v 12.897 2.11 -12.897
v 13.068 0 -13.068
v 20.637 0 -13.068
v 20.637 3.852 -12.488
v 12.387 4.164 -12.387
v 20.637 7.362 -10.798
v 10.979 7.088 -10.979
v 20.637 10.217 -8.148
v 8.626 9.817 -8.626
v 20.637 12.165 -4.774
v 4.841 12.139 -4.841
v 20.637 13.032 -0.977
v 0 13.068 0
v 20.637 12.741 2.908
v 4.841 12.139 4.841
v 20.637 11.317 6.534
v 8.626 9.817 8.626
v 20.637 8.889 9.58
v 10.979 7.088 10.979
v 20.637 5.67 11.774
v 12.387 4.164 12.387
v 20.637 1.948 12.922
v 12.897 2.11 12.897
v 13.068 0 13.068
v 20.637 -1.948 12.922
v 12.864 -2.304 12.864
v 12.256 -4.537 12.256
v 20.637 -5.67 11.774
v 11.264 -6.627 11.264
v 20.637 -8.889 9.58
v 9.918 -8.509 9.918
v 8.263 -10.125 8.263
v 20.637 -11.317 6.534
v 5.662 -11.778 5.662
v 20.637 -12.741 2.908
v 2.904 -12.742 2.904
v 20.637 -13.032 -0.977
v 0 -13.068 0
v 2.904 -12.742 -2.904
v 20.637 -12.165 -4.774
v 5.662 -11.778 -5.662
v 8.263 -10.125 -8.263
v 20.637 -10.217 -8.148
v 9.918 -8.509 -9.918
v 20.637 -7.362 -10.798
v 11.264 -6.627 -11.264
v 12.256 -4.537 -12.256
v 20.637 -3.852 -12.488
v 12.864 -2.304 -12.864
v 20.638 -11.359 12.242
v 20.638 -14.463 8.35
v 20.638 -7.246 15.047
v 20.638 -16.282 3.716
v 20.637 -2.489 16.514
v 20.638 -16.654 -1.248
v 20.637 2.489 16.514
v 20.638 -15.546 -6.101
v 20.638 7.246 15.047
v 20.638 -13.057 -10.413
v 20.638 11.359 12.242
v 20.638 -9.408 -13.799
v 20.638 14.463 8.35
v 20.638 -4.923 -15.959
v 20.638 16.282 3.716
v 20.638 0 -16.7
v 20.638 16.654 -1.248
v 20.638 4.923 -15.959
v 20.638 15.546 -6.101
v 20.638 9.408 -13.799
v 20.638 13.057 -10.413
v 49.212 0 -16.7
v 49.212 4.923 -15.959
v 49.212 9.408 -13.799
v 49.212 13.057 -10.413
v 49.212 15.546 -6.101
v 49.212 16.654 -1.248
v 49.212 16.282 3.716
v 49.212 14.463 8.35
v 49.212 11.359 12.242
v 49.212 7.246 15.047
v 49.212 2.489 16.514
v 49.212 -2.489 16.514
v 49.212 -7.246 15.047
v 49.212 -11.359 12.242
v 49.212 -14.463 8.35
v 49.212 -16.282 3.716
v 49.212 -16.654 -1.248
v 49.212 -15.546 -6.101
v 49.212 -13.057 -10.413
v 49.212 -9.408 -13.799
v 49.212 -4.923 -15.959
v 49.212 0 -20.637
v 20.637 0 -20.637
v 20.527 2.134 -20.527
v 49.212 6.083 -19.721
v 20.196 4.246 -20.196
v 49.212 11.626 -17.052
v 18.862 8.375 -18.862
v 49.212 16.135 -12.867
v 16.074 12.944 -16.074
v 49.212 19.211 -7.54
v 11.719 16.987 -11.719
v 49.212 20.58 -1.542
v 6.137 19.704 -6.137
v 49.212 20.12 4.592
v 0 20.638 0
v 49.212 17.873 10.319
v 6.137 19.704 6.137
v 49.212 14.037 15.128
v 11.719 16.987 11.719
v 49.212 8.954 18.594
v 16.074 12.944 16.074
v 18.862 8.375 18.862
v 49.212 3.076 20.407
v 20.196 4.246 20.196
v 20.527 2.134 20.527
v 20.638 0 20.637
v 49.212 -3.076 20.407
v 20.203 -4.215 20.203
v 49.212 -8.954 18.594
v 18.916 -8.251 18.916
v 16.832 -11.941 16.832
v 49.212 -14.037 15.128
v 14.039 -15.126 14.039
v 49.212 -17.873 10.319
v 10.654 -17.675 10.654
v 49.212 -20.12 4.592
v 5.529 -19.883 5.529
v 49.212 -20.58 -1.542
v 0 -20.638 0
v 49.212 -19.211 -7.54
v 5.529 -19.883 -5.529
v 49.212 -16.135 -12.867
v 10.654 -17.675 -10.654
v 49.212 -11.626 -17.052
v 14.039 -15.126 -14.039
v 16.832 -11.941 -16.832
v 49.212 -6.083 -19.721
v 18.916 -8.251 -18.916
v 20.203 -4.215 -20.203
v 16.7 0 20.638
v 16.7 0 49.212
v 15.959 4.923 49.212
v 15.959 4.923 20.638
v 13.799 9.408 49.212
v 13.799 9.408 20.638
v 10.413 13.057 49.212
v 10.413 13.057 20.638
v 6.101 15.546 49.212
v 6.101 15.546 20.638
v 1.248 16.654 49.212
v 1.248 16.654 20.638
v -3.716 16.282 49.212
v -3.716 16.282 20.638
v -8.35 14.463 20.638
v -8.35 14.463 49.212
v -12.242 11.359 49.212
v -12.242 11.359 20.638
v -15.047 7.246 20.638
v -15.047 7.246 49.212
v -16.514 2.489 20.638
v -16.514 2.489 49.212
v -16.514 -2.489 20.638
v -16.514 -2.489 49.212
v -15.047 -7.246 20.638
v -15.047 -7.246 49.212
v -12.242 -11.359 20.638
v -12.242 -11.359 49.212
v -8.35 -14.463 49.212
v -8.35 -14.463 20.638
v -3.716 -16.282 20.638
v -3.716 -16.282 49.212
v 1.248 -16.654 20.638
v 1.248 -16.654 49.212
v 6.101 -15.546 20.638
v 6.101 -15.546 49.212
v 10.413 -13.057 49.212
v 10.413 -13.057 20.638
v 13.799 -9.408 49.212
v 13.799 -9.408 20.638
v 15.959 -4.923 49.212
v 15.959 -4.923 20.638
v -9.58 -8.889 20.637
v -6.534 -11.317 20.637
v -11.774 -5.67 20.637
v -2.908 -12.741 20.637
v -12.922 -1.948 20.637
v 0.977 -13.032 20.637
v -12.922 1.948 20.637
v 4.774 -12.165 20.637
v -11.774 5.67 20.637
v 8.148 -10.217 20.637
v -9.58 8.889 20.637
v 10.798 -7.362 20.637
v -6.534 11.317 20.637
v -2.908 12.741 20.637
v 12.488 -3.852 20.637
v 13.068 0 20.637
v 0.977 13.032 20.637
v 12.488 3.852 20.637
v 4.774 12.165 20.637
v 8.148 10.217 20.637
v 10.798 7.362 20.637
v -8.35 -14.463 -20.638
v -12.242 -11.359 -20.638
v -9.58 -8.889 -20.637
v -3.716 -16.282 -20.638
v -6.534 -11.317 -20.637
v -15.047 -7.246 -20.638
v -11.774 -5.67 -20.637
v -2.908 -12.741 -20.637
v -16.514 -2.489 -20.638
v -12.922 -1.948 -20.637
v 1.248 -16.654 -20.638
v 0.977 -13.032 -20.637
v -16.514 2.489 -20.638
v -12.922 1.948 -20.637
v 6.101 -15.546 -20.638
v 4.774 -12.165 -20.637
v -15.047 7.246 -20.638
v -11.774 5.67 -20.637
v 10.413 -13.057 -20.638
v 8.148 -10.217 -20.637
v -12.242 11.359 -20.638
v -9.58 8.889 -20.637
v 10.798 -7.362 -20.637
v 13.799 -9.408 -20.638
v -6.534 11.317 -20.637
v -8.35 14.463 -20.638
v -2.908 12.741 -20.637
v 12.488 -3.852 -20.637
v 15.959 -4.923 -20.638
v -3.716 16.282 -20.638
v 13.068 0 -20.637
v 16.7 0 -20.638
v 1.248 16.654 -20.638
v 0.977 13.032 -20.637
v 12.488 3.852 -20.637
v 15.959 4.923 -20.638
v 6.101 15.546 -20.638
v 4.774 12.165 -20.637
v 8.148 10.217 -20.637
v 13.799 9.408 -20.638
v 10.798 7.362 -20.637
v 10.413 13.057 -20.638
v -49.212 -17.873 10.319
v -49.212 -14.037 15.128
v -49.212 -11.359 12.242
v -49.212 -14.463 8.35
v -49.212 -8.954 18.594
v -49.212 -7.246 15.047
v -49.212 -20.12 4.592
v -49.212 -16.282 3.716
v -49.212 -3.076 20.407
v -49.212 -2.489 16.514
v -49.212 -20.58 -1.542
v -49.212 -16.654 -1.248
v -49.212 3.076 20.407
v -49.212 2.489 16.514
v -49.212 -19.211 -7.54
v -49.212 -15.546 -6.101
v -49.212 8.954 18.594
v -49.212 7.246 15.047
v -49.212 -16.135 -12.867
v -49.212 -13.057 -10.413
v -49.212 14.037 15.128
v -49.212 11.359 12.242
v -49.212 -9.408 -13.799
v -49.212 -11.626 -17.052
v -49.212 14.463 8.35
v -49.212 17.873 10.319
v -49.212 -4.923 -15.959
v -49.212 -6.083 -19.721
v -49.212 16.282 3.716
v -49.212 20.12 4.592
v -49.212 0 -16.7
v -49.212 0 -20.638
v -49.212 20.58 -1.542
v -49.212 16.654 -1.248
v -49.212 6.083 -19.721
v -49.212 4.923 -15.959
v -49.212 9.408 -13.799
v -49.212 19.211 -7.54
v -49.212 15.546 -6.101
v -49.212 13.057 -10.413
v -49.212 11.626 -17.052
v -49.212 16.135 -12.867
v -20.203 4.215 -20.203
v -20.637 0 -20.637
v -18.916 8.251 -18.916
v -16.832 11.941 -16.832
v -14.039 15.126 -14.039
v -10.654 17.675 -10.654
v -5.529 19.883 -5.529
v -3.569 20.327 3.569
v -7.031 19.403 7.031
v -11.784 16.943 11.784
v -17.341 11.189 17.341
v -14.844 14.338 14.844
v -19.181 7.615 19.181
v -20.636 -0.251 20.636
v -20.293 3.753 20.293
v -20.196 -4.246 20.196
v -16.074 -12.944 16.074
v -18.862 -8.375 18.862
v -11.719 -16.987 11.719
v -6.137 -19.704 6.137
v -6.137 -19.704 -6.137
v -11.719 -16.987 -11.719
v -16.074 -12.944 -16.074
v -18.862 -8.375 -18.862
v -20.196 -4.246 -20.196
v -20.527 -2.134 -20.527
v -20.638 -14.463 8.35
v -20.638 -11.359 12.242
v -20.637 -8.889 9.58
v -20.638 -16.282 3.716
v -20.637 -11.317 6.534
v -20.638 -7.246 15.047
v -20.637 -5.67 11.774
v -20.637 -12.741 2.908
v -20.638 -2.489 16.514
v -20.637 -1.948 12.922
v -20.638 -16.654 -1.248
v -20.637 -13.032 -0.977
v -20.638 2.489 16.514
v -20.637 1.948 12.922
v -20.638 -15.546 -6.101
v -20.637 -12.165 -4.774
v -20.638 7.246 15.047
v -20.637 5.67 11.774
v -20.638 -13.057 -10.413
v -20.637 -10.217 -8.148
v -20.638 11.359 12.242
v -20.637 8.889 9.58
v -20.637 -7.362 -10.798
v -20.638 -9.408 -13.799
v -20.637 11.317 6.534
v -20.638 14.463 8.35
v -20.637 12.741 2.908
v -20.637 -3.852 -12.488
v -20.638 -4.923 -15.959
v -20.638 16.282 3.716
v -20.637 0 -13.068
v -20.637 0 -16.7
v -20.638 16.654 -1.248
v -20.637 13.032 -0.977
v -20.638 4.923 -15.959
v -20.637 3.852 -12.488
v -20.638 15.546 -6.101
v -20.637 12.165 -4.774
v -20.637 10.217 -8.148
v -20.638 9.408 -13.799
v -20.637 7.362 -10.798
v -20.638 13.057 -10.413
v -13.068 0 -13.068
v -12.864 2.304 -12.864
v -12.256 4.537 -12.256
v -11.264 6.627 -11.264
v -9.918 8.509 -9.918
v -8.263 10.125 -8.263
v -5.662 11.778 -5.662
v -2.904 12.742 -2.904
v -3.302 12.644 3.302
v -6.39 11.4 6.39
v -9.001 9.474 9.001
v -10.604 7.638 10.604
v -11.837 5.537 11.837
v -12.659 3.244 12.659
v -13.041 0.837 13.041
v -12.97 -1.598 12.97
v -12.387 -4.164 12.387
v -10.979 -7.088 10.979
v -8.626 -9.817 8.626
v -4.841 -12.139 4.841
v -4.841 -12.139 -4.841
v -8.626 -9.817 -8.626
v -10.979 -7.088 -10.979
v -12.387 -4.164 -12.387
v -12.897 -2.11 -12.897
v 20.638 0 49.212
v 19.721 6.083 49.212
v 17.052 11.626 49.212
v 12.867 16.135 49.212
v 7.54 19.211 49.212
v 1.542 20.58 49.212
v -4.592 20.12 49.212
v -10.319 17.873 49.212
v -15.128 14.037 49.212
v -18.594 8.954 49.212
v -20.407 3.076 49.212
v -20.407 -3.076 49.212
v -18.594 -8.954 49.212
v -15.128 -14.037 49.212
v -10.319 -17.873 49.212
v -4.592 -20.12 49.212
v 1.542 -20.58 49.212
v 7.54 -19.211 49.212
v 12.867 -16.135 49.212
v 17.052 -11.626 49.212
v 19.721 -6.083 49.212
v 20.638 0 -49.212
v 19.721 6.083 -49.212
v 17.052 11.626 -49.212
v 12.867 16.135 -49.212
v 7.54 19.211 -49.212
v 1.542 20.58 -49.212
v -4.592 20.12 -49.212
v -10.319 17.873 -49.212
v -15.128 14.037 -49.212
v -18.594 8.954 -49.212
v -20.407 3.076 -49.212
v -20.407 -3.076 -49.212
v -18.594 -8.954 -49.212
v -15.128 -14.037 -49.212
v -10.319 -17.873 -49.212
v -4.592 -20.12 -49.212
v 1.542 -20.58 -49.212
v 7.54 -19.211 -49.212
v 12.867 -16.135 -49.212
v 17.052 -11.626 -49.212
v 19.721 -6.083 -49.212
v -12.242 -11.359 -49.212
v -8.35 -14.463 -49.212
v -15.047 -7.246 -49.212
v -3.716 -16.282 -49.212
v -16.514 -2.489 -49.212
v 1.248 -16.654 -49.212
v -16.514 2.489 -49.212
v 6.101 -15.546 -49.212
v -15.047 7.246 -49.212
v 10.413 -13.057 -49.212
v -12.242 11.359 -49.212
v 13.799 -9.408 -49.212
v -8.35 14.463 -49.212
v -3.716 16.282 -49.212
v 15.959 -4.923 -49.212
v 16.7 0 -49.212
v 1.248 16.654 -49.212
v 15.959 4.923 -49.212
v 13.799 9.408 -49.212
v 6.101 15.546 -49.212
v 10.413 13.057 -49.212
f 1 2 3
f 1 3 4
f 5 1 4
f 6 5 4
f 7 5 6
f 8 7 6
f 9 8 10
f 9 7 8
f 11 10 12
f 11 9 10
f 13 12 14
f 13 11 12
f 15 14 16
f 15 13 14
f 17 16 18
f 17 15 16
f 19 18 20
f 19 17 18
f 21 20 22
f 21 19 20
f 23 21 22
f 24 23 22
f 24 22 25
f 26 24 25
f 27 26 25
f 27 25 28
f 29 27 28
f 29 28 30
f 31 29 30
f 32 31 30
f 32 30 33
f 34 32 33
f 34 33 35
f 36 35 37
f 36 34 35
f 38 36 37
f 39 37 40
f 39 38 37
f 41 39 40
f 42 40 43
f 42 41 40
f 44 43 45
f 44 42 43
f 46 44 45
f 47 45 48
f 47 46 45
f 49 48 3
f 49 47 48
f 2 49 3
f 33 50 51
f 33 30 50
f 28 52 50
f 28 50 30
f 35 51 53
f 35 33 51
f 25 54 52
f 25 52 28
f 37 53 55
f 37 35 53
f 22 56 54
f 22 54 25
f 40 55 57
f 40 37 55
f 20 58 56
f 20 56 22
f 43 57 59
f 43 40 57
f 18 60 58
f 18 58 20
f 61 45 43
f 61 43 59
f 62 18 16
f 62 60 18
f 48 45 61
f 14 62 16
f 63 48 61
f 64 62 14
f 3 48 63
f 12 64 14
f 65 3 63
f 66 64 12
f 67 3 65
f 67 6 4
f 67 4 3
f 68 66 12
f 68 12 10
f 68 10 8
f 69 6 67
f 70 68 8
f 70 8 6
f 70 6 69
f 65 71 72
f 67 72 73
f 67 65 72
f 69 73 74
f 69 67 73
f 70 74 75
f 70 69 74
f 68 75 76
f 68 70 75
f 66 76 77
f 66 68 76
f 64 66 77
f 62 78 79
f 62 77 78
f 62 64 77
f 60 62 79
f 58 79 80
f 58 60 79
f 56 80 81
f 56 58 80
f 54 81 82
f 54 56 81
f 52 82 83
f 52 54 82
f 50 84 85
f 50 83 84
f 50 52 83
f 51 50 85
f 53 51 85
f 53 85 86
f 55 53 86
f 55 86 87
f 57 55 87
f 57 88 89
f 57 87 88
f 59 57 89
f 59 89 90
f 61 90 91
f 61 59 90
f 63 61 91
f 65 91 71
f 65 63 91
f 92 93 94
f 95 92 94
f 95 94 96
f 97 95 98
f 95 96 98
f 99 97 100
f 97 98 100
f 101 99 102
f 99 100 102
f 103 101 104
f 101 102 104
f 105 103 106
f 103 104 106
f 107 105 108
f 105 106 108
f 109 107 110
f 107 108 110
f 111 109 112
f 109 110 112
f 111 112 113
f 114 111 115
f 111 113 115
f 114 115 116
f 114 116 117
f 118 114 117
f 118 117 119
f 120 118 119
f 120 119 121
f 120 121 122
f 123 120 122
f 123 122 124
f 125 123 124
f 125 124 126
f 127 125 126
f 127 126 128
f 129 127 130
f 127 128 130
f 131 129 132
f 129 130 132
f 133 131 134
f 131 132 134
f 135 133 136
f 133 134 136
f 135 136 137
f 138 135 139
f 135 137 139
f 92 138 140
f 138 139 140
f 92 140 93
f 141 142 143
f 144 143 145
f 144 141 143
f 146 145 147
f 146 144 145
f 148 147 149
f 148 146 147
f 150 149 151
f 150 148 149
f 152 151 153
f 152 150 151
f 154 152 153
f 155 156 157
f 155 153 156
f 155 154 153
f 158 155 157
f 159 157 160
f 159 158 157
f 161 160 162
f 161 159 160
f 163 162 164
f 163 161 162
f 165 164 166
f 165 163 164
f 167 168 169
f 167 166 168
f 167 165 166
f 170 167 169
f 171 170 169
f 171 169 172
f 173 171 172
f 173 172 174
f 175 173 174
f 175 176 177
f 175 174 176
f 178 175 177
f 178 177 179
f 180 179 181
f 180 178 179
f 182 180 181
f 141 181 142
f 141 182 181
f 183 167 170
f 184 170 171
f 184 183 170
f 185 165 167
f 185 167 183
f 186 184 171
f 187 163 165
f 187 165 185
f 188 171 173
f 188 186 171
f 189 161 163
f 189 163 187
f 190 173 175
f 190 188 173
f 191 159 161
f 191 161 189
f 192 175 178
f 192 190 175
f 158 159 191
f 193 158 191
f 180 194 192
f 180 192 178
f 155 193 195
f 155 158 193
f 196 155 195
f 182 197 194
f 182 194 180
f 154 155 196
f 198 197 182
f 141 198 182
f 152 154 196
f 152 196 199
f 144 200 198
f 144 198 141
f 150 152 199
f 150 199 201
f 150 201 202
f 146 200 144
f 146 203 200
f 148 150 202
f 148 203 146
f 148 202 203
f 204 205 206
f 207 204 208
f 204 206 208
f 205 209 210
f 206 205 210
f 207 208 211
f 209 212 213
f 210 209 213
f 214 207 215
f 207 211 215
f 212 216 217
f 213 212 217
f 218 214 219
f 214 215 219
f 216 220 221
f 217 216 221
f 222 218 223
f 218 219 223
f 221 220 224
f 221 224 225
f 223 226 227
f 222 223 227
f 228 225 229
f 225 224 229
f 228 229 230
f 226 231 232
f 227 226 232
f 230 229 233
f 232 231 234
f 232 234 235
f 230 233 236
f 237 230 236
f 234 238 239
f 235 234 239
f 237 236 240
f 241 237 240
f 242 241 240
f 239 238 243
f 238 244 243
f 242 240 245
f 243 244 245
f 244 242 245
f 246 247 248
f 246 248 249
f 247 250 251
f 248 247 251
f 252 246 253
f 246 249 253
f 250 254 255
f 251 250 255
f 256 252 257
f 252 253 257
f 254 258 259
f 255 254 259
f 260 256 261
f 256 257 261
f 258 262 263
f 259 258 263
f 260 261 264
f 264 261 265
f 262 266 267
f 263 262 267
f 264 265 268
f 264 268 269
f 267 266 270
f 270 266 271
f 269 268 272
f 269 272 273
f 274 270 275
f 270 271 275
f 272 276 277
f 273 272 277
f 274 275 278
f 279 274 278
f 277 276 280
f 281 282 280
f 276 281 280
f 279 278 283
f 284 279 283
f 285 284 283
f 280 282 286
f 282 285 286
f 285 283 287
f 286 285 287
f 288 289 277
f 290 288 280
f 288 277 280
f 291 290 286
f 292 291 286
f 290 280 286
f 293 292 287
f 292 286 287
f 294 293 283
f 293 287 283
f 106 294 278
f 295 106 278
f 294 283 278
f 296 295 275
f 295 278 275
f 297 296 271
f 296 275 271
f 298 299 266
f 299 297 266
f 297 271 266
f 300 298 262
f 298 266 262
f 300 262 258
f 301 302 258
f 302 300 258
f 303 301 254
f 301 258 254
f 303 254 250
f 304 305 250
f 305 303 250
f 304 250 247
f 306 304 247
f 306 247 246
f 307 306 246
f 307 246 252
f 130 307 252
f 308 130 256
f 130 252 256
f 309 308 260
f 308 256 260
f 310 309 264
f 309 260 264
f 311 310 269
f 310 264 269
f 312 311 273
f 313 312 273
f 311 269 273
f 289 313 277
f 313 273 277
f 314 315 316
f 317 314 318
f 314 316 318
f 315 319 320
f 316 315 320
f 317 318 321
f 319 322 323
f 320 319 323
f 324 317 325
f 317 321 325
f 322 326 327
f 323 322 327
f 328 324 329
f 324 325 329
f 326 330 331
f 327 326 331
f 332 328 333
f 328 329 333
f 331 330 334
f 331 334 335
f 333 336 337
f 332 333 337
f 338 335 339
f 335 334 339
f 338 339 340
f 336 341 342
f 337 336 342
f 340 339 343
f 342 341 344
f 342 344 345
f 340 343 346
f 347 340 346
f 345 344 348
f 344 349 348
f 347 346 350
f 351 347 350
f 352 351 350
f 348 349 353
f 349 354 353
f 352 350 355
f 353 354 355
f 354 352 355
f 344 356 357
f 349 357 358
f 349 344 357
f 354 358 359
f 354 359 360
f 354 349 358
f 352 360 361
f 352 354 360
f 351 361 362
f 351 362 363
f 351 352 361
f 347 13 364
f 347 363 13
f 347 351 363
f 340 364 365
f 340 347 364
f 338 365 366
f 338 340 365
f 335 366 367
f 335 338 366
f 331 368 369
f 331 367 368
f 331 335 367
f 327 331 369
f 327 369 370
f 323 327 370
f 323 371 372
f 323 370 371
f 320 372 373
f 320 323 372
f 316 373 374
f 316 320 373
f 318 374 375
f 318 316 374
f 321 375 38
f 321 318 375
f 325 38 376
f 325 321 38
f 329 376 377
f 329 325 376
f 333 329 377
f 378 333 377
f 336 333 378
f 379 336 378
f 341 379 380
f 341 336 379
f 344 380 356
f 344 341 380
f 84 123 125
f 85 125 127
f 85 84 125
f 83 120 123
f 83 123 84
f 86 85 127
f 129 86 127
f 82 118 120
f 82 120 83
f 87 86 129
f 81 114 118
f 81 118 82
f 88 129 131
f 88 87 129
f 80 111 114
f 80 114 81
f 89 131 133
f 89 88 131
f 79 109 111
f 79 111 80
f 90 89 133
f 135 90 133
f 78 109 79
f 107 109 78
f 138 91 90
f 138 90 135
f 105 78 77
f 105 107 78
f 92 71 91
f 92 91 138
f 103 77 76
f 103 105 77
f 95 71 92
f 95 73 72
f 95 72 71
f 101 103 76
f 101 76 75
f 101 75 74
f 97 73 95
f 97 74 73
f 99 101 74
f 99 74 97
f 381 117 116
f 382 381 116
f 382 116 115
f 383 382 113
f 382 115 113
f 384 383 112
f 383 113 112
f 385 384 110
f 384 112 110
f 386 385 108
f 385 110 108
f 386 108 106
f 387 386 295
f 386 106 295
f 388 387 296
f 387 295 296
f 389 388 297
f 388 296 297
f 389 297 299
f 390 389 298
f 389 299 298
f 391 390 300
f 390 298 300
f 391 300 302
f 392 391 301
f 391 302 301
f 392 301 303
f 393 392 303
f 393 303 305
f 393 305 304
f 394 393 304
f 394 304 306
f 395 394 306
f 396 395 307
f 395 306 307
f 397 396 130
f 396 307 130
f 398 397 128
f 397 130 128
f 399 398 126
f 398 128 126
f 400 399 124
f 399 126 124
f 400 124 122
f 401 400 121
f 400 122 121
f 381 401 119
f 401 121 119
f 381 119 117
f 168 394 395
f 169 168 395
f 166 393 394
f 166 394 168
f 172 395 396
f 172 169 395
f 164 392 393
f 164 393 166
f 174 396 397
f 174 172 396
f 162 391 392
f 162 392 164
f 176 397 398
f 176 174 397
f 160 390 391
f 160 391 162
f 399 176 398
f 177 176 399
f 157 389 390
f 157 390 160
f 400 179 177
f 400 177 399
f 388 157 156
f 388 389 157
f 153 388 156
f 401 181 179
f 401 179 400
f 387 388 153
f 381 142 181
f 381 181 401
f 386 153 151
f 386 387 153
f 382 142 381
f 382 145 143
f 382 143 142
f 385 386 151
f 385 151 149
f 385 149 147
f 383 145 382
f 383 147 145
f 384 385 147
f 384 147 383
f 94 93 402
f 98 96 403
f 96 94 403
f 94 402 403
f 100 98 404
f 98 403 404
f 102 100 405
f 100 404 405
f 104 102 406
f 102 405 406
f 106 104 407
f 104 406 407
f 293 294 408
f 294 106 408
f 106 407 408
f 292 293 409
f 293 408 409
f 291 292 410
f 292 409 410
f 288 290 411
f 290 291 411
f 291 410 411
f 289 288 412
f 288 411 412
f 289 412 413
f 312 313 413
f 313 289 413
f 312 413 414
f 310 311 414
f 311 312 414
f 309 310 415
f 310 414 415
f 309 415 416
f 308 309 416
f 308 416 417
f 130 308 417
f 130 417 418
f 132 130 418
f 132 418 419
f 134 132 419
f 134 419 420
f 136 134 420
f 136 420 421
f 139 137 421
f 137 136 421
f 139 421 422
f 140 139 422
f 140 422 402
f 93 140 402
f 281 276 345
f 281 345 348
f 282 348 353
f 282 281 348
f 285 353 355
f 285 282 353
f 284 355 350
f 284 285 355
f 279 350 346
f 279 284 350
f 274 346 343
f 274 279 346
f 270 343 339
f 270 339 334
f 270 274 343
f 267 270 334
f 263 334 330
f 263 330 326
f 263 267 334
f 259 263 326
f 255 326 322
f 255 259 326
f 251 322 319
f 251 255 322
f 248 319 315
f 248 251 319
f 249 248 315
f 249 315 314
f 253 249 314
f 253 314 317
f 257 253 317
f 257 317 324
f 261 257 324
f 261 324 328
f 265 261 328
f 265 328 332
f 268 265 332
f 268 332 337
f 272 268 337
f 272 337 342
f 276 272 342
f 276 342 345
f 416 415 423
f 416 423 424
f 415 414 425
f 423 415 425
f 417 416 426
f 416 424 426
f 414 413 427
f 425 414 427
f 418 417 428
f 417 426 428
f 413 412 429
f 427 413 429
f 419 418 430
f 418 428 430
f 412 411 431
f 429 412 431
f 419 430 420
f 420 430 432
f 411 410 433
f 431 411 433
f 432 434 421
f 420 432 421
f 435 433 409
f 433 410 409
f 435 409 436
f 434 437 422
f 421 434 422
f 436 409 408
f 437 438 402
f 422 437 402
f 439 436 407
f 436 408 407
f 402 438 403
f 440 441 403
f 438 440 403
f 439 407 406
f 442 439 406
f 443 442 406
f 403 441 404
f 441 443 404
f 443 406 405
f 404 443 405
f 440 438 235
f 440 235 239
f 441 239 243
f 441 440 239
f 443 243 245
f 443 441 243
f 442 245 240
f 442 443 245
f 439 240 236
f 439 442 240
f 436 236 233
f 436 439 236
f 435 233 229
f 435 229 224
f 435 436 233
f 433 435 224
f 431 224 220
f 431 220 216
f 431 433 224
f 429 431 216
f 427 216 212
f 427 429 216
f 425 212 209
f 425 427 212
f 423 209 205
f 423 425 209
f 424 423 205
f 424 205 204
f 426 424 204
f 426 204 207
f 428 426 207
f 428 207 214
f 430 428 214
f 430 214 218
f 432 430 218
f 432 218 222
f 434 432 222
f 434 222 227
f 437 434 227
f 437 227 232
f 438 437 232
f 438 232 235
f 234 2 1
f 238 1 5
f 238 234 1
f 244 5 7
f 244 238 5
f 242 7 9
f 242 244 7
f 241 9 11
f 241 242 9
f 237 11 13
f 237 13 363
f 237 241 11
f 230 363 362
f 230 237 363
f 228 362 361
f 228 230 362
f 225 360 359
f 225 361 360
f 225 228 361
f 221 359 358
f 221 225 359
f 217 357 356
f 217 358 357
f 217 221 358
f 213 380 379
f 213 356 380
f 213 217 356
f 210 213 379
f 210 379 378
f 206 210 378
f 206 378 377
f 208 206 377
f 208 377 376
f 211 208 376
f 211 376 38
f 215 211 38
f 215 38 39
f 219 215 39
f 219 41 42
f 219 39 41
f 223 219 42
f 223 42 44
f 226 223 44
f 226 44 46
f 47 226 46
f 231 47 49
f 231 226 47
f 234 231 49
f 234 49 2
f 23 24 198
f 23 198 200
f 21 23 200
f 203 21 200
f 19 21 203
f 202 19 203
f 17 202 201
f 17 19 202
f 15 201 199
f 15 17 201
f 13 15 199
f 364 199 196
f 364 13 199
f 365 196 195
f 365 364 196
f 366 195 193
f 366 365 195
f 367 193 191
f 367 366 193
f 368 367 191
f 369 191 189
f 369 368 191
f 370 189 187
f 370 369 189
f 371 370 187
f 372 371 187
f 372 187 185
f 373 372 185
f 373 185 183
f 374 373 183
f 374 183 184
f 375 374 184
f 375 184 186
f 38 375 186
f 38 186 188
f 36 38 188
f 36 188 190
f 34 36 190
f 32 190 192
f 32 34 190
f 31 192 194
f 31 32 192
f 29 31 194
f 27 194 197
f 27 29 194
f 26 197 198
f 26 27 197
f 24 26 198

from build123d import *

# Parameters (mm, degrees)
SOCKETRIGHT_R                       = 16.7005
SOCKETRIGHT_DEPTH                   = 31.4325
SOCKETRIGHT_PITCH_ANGLE             = 90
SOCKETTOP_R                         = 16.7005
SOCKETTOP_DEPTH                     = 31.4325
SOCKETBOTTOM_R                      = 16.7005
SOCKETBOTTOM_DEPTH                  = 31.4325
SOCKETLEFT_R                        = 16.7005
SOCKETLEFT_DEPTH                    = 31.4325
SOCKETLEFT_PITCH_ANGLE              = 90
HORIZONTALINNERCYNLIDER_R           = 13.0683
HORIZONTALINNERCYNLIDER_DEPTH       = 108.2675
HORIZONTALINNERCYNLIDER_PITCH_ANGLE = 90
VERTICALINNERCYNLIDER_R             = 13.0683
VERTICALINNERCYNLIDER_DEPTH         = 108.2675
HORIZONTALOUTERCYNLIDER_R           = 20.6375
HORIZONTALOUTERCYNLIDER_DEPTH       = 98.425
HORIZONTALOUTERCYNLIDER_PITCH_ANGLE = 90
VERTICALOUTERCYNLIDER_R             = 20.6375
VERTICALOUTERCYNLIDER_DEPTH         = 98.425


with BuildPart() as socketright:
    # SocketRight → SocketRight (new body)
    with BuildSketch(Plane.XY):
        Circle(SOCKETRIGHT_R)
    extrude(amount=SOCKETRIGHT_DEPTH)


with BuildPart() as socketright_1:
    # SocketRight pitch: moved
    add(socketright.part.rotate(Axis((0, 0, 0), (0, 1, 0)), SOCKETRIGHT_PITCH_ANGLE))


with BuildPart() as socketright_2:
    # SocketRight placement: moved
    add(socketright_1.part.moved(Location((20.6375, 0, 0))))


with BuildPart() as sockettop:
    # SocketTop → SocketTop (new body)
    with BuildSketch(Plane.XY.offset(20.6375)):
        Circle(SOCKETTOP_R)
    extrude(amount=SOCKETTOP_DEPTH)


with BuildPart() as socketbottom:
    # SocketBottom → SocketBottom (new body)
    with BuildSketch(Plane.XY.offset(-52.07)):
        Circle(SOCKETBOTTOM_R)
    extrude(amount=SOCKETBOTTOM_DEPTH)


with BuildPart() as sockets:
    # SocketLeft → SocketLeft (new body)
    with BuildSketch(Plane.XY):
        Circle(SOCKETLEFT_R)
    extrude(amount=SOCKETLEFT_DEPTH)


with BuildPart() as sockets_1:
    # SocketLeft pitch: moved
    add(sockets.part.rotate(Axis((0, 0, 0), (0, 1, 0)), SOCKETLEFT_PITCH_ANGLE))


with BuildPart() as sockets_2:
    # SocketLeft placement: moved
    add(sockets_1.part.moved(Location((-52.07, 0, 0))))

    # Sockets: union SocketRight, SocketTop, SocketBottom
    add(socketright_2.part)
    add(sockettop.part)
    add(socketbottom.part)


with BuildPart() as horizontalinnercynlider:
    # HorizontalInnerCynlider → HorizontalInnerCynlider (new body)
    with BuildSketch(Plane.XY):
        Circle(HORIZONTALINNERCYNLIDER_R)
    extrude(amount=HORIZONTALINNERCYNLIDER_DEPTH)


with BuildPart() as horizontalinnercynlider_1:
    # HorizontalInnerCynlider pitch: moved
    add(horizontalinnercynlider.part.rotate(Axis((0, 0, 0), (0, 1, 0)), HORIZONTALINNERCYNLIDER_PITCH_ANGLE))


with BuildPart() as horizontalinnercynlider_2:
    # HorizontalInnerCynlider placement: moved
    add(horizontalinnercynlider_1.part.moved(Location((-54.13375, 0, 0))))


with BuildPart() as innercrossfusion:
    # VerticalInnerCynlider → VerticalInnerCynlider (new body)
    with BuildSketch(Plane.XY.offset(-54.13375)):
        Circle(VERTICALINNERCYNLIDER_R)
    extrude(amount=VERTICALINNERCYNLIDER_DEPTH)

    # InnerCrossFusion: union HorizontalInnerCynlider
    add(horizontalinnercynlider_2.part)


with BuildPart() as horizontaloutercynlider:
    # HorizontalOuterCynlider → HorizontalOuterCynlider (new body)
    with BuildSketch(Plane.XY):
        Circle(HORIZONTALOUTERCYNLIDER_R)
    extrude(amount=HORIZONTALOUTERCYNLIDER_DEPTH)


with BuildPart() as horizontaloutercynlider_1:
    # HorizontalOuterCynlider pitch: moved
    add(horizontaloutercynlider.part.rotate(Axis((0, 0, 0), (0, 1, 0)), HORIZONTALOUTERCYNLIDER_PITCH_ANGLE))


with BuildPart() as horizontaloutercynlider_2:
    # HorizontalOuterCynlider placement: moved
    add(horizontaloutercynlider_1.part.moved(Location((-49.2125, 0, 0))))


with BuildPart() as cross:
    # VerticalOuterCynlider → VerticalOuterCynlider (new body)
    with BuildSketch(Plane.XY.offset(-49.2125)):
        Circle(VERTICALOUTERCYNLIDER_R)
    extrude(amount=VERTICALOUTERCYNLIDER_DEPTH)

    # OuterCrossFusion: union HorizontalOuterCynlider
    add(horizontaloutercynlider_2.part)

    # Cut: cut InnerCrossFusion
    add(innercrossfusion.part, mode=Mode.SUBTRACT)

    # Cross: cut Sockets
    add(sockets_2.part, mode=Mode.SUBTRACT)


solid = cross.part
